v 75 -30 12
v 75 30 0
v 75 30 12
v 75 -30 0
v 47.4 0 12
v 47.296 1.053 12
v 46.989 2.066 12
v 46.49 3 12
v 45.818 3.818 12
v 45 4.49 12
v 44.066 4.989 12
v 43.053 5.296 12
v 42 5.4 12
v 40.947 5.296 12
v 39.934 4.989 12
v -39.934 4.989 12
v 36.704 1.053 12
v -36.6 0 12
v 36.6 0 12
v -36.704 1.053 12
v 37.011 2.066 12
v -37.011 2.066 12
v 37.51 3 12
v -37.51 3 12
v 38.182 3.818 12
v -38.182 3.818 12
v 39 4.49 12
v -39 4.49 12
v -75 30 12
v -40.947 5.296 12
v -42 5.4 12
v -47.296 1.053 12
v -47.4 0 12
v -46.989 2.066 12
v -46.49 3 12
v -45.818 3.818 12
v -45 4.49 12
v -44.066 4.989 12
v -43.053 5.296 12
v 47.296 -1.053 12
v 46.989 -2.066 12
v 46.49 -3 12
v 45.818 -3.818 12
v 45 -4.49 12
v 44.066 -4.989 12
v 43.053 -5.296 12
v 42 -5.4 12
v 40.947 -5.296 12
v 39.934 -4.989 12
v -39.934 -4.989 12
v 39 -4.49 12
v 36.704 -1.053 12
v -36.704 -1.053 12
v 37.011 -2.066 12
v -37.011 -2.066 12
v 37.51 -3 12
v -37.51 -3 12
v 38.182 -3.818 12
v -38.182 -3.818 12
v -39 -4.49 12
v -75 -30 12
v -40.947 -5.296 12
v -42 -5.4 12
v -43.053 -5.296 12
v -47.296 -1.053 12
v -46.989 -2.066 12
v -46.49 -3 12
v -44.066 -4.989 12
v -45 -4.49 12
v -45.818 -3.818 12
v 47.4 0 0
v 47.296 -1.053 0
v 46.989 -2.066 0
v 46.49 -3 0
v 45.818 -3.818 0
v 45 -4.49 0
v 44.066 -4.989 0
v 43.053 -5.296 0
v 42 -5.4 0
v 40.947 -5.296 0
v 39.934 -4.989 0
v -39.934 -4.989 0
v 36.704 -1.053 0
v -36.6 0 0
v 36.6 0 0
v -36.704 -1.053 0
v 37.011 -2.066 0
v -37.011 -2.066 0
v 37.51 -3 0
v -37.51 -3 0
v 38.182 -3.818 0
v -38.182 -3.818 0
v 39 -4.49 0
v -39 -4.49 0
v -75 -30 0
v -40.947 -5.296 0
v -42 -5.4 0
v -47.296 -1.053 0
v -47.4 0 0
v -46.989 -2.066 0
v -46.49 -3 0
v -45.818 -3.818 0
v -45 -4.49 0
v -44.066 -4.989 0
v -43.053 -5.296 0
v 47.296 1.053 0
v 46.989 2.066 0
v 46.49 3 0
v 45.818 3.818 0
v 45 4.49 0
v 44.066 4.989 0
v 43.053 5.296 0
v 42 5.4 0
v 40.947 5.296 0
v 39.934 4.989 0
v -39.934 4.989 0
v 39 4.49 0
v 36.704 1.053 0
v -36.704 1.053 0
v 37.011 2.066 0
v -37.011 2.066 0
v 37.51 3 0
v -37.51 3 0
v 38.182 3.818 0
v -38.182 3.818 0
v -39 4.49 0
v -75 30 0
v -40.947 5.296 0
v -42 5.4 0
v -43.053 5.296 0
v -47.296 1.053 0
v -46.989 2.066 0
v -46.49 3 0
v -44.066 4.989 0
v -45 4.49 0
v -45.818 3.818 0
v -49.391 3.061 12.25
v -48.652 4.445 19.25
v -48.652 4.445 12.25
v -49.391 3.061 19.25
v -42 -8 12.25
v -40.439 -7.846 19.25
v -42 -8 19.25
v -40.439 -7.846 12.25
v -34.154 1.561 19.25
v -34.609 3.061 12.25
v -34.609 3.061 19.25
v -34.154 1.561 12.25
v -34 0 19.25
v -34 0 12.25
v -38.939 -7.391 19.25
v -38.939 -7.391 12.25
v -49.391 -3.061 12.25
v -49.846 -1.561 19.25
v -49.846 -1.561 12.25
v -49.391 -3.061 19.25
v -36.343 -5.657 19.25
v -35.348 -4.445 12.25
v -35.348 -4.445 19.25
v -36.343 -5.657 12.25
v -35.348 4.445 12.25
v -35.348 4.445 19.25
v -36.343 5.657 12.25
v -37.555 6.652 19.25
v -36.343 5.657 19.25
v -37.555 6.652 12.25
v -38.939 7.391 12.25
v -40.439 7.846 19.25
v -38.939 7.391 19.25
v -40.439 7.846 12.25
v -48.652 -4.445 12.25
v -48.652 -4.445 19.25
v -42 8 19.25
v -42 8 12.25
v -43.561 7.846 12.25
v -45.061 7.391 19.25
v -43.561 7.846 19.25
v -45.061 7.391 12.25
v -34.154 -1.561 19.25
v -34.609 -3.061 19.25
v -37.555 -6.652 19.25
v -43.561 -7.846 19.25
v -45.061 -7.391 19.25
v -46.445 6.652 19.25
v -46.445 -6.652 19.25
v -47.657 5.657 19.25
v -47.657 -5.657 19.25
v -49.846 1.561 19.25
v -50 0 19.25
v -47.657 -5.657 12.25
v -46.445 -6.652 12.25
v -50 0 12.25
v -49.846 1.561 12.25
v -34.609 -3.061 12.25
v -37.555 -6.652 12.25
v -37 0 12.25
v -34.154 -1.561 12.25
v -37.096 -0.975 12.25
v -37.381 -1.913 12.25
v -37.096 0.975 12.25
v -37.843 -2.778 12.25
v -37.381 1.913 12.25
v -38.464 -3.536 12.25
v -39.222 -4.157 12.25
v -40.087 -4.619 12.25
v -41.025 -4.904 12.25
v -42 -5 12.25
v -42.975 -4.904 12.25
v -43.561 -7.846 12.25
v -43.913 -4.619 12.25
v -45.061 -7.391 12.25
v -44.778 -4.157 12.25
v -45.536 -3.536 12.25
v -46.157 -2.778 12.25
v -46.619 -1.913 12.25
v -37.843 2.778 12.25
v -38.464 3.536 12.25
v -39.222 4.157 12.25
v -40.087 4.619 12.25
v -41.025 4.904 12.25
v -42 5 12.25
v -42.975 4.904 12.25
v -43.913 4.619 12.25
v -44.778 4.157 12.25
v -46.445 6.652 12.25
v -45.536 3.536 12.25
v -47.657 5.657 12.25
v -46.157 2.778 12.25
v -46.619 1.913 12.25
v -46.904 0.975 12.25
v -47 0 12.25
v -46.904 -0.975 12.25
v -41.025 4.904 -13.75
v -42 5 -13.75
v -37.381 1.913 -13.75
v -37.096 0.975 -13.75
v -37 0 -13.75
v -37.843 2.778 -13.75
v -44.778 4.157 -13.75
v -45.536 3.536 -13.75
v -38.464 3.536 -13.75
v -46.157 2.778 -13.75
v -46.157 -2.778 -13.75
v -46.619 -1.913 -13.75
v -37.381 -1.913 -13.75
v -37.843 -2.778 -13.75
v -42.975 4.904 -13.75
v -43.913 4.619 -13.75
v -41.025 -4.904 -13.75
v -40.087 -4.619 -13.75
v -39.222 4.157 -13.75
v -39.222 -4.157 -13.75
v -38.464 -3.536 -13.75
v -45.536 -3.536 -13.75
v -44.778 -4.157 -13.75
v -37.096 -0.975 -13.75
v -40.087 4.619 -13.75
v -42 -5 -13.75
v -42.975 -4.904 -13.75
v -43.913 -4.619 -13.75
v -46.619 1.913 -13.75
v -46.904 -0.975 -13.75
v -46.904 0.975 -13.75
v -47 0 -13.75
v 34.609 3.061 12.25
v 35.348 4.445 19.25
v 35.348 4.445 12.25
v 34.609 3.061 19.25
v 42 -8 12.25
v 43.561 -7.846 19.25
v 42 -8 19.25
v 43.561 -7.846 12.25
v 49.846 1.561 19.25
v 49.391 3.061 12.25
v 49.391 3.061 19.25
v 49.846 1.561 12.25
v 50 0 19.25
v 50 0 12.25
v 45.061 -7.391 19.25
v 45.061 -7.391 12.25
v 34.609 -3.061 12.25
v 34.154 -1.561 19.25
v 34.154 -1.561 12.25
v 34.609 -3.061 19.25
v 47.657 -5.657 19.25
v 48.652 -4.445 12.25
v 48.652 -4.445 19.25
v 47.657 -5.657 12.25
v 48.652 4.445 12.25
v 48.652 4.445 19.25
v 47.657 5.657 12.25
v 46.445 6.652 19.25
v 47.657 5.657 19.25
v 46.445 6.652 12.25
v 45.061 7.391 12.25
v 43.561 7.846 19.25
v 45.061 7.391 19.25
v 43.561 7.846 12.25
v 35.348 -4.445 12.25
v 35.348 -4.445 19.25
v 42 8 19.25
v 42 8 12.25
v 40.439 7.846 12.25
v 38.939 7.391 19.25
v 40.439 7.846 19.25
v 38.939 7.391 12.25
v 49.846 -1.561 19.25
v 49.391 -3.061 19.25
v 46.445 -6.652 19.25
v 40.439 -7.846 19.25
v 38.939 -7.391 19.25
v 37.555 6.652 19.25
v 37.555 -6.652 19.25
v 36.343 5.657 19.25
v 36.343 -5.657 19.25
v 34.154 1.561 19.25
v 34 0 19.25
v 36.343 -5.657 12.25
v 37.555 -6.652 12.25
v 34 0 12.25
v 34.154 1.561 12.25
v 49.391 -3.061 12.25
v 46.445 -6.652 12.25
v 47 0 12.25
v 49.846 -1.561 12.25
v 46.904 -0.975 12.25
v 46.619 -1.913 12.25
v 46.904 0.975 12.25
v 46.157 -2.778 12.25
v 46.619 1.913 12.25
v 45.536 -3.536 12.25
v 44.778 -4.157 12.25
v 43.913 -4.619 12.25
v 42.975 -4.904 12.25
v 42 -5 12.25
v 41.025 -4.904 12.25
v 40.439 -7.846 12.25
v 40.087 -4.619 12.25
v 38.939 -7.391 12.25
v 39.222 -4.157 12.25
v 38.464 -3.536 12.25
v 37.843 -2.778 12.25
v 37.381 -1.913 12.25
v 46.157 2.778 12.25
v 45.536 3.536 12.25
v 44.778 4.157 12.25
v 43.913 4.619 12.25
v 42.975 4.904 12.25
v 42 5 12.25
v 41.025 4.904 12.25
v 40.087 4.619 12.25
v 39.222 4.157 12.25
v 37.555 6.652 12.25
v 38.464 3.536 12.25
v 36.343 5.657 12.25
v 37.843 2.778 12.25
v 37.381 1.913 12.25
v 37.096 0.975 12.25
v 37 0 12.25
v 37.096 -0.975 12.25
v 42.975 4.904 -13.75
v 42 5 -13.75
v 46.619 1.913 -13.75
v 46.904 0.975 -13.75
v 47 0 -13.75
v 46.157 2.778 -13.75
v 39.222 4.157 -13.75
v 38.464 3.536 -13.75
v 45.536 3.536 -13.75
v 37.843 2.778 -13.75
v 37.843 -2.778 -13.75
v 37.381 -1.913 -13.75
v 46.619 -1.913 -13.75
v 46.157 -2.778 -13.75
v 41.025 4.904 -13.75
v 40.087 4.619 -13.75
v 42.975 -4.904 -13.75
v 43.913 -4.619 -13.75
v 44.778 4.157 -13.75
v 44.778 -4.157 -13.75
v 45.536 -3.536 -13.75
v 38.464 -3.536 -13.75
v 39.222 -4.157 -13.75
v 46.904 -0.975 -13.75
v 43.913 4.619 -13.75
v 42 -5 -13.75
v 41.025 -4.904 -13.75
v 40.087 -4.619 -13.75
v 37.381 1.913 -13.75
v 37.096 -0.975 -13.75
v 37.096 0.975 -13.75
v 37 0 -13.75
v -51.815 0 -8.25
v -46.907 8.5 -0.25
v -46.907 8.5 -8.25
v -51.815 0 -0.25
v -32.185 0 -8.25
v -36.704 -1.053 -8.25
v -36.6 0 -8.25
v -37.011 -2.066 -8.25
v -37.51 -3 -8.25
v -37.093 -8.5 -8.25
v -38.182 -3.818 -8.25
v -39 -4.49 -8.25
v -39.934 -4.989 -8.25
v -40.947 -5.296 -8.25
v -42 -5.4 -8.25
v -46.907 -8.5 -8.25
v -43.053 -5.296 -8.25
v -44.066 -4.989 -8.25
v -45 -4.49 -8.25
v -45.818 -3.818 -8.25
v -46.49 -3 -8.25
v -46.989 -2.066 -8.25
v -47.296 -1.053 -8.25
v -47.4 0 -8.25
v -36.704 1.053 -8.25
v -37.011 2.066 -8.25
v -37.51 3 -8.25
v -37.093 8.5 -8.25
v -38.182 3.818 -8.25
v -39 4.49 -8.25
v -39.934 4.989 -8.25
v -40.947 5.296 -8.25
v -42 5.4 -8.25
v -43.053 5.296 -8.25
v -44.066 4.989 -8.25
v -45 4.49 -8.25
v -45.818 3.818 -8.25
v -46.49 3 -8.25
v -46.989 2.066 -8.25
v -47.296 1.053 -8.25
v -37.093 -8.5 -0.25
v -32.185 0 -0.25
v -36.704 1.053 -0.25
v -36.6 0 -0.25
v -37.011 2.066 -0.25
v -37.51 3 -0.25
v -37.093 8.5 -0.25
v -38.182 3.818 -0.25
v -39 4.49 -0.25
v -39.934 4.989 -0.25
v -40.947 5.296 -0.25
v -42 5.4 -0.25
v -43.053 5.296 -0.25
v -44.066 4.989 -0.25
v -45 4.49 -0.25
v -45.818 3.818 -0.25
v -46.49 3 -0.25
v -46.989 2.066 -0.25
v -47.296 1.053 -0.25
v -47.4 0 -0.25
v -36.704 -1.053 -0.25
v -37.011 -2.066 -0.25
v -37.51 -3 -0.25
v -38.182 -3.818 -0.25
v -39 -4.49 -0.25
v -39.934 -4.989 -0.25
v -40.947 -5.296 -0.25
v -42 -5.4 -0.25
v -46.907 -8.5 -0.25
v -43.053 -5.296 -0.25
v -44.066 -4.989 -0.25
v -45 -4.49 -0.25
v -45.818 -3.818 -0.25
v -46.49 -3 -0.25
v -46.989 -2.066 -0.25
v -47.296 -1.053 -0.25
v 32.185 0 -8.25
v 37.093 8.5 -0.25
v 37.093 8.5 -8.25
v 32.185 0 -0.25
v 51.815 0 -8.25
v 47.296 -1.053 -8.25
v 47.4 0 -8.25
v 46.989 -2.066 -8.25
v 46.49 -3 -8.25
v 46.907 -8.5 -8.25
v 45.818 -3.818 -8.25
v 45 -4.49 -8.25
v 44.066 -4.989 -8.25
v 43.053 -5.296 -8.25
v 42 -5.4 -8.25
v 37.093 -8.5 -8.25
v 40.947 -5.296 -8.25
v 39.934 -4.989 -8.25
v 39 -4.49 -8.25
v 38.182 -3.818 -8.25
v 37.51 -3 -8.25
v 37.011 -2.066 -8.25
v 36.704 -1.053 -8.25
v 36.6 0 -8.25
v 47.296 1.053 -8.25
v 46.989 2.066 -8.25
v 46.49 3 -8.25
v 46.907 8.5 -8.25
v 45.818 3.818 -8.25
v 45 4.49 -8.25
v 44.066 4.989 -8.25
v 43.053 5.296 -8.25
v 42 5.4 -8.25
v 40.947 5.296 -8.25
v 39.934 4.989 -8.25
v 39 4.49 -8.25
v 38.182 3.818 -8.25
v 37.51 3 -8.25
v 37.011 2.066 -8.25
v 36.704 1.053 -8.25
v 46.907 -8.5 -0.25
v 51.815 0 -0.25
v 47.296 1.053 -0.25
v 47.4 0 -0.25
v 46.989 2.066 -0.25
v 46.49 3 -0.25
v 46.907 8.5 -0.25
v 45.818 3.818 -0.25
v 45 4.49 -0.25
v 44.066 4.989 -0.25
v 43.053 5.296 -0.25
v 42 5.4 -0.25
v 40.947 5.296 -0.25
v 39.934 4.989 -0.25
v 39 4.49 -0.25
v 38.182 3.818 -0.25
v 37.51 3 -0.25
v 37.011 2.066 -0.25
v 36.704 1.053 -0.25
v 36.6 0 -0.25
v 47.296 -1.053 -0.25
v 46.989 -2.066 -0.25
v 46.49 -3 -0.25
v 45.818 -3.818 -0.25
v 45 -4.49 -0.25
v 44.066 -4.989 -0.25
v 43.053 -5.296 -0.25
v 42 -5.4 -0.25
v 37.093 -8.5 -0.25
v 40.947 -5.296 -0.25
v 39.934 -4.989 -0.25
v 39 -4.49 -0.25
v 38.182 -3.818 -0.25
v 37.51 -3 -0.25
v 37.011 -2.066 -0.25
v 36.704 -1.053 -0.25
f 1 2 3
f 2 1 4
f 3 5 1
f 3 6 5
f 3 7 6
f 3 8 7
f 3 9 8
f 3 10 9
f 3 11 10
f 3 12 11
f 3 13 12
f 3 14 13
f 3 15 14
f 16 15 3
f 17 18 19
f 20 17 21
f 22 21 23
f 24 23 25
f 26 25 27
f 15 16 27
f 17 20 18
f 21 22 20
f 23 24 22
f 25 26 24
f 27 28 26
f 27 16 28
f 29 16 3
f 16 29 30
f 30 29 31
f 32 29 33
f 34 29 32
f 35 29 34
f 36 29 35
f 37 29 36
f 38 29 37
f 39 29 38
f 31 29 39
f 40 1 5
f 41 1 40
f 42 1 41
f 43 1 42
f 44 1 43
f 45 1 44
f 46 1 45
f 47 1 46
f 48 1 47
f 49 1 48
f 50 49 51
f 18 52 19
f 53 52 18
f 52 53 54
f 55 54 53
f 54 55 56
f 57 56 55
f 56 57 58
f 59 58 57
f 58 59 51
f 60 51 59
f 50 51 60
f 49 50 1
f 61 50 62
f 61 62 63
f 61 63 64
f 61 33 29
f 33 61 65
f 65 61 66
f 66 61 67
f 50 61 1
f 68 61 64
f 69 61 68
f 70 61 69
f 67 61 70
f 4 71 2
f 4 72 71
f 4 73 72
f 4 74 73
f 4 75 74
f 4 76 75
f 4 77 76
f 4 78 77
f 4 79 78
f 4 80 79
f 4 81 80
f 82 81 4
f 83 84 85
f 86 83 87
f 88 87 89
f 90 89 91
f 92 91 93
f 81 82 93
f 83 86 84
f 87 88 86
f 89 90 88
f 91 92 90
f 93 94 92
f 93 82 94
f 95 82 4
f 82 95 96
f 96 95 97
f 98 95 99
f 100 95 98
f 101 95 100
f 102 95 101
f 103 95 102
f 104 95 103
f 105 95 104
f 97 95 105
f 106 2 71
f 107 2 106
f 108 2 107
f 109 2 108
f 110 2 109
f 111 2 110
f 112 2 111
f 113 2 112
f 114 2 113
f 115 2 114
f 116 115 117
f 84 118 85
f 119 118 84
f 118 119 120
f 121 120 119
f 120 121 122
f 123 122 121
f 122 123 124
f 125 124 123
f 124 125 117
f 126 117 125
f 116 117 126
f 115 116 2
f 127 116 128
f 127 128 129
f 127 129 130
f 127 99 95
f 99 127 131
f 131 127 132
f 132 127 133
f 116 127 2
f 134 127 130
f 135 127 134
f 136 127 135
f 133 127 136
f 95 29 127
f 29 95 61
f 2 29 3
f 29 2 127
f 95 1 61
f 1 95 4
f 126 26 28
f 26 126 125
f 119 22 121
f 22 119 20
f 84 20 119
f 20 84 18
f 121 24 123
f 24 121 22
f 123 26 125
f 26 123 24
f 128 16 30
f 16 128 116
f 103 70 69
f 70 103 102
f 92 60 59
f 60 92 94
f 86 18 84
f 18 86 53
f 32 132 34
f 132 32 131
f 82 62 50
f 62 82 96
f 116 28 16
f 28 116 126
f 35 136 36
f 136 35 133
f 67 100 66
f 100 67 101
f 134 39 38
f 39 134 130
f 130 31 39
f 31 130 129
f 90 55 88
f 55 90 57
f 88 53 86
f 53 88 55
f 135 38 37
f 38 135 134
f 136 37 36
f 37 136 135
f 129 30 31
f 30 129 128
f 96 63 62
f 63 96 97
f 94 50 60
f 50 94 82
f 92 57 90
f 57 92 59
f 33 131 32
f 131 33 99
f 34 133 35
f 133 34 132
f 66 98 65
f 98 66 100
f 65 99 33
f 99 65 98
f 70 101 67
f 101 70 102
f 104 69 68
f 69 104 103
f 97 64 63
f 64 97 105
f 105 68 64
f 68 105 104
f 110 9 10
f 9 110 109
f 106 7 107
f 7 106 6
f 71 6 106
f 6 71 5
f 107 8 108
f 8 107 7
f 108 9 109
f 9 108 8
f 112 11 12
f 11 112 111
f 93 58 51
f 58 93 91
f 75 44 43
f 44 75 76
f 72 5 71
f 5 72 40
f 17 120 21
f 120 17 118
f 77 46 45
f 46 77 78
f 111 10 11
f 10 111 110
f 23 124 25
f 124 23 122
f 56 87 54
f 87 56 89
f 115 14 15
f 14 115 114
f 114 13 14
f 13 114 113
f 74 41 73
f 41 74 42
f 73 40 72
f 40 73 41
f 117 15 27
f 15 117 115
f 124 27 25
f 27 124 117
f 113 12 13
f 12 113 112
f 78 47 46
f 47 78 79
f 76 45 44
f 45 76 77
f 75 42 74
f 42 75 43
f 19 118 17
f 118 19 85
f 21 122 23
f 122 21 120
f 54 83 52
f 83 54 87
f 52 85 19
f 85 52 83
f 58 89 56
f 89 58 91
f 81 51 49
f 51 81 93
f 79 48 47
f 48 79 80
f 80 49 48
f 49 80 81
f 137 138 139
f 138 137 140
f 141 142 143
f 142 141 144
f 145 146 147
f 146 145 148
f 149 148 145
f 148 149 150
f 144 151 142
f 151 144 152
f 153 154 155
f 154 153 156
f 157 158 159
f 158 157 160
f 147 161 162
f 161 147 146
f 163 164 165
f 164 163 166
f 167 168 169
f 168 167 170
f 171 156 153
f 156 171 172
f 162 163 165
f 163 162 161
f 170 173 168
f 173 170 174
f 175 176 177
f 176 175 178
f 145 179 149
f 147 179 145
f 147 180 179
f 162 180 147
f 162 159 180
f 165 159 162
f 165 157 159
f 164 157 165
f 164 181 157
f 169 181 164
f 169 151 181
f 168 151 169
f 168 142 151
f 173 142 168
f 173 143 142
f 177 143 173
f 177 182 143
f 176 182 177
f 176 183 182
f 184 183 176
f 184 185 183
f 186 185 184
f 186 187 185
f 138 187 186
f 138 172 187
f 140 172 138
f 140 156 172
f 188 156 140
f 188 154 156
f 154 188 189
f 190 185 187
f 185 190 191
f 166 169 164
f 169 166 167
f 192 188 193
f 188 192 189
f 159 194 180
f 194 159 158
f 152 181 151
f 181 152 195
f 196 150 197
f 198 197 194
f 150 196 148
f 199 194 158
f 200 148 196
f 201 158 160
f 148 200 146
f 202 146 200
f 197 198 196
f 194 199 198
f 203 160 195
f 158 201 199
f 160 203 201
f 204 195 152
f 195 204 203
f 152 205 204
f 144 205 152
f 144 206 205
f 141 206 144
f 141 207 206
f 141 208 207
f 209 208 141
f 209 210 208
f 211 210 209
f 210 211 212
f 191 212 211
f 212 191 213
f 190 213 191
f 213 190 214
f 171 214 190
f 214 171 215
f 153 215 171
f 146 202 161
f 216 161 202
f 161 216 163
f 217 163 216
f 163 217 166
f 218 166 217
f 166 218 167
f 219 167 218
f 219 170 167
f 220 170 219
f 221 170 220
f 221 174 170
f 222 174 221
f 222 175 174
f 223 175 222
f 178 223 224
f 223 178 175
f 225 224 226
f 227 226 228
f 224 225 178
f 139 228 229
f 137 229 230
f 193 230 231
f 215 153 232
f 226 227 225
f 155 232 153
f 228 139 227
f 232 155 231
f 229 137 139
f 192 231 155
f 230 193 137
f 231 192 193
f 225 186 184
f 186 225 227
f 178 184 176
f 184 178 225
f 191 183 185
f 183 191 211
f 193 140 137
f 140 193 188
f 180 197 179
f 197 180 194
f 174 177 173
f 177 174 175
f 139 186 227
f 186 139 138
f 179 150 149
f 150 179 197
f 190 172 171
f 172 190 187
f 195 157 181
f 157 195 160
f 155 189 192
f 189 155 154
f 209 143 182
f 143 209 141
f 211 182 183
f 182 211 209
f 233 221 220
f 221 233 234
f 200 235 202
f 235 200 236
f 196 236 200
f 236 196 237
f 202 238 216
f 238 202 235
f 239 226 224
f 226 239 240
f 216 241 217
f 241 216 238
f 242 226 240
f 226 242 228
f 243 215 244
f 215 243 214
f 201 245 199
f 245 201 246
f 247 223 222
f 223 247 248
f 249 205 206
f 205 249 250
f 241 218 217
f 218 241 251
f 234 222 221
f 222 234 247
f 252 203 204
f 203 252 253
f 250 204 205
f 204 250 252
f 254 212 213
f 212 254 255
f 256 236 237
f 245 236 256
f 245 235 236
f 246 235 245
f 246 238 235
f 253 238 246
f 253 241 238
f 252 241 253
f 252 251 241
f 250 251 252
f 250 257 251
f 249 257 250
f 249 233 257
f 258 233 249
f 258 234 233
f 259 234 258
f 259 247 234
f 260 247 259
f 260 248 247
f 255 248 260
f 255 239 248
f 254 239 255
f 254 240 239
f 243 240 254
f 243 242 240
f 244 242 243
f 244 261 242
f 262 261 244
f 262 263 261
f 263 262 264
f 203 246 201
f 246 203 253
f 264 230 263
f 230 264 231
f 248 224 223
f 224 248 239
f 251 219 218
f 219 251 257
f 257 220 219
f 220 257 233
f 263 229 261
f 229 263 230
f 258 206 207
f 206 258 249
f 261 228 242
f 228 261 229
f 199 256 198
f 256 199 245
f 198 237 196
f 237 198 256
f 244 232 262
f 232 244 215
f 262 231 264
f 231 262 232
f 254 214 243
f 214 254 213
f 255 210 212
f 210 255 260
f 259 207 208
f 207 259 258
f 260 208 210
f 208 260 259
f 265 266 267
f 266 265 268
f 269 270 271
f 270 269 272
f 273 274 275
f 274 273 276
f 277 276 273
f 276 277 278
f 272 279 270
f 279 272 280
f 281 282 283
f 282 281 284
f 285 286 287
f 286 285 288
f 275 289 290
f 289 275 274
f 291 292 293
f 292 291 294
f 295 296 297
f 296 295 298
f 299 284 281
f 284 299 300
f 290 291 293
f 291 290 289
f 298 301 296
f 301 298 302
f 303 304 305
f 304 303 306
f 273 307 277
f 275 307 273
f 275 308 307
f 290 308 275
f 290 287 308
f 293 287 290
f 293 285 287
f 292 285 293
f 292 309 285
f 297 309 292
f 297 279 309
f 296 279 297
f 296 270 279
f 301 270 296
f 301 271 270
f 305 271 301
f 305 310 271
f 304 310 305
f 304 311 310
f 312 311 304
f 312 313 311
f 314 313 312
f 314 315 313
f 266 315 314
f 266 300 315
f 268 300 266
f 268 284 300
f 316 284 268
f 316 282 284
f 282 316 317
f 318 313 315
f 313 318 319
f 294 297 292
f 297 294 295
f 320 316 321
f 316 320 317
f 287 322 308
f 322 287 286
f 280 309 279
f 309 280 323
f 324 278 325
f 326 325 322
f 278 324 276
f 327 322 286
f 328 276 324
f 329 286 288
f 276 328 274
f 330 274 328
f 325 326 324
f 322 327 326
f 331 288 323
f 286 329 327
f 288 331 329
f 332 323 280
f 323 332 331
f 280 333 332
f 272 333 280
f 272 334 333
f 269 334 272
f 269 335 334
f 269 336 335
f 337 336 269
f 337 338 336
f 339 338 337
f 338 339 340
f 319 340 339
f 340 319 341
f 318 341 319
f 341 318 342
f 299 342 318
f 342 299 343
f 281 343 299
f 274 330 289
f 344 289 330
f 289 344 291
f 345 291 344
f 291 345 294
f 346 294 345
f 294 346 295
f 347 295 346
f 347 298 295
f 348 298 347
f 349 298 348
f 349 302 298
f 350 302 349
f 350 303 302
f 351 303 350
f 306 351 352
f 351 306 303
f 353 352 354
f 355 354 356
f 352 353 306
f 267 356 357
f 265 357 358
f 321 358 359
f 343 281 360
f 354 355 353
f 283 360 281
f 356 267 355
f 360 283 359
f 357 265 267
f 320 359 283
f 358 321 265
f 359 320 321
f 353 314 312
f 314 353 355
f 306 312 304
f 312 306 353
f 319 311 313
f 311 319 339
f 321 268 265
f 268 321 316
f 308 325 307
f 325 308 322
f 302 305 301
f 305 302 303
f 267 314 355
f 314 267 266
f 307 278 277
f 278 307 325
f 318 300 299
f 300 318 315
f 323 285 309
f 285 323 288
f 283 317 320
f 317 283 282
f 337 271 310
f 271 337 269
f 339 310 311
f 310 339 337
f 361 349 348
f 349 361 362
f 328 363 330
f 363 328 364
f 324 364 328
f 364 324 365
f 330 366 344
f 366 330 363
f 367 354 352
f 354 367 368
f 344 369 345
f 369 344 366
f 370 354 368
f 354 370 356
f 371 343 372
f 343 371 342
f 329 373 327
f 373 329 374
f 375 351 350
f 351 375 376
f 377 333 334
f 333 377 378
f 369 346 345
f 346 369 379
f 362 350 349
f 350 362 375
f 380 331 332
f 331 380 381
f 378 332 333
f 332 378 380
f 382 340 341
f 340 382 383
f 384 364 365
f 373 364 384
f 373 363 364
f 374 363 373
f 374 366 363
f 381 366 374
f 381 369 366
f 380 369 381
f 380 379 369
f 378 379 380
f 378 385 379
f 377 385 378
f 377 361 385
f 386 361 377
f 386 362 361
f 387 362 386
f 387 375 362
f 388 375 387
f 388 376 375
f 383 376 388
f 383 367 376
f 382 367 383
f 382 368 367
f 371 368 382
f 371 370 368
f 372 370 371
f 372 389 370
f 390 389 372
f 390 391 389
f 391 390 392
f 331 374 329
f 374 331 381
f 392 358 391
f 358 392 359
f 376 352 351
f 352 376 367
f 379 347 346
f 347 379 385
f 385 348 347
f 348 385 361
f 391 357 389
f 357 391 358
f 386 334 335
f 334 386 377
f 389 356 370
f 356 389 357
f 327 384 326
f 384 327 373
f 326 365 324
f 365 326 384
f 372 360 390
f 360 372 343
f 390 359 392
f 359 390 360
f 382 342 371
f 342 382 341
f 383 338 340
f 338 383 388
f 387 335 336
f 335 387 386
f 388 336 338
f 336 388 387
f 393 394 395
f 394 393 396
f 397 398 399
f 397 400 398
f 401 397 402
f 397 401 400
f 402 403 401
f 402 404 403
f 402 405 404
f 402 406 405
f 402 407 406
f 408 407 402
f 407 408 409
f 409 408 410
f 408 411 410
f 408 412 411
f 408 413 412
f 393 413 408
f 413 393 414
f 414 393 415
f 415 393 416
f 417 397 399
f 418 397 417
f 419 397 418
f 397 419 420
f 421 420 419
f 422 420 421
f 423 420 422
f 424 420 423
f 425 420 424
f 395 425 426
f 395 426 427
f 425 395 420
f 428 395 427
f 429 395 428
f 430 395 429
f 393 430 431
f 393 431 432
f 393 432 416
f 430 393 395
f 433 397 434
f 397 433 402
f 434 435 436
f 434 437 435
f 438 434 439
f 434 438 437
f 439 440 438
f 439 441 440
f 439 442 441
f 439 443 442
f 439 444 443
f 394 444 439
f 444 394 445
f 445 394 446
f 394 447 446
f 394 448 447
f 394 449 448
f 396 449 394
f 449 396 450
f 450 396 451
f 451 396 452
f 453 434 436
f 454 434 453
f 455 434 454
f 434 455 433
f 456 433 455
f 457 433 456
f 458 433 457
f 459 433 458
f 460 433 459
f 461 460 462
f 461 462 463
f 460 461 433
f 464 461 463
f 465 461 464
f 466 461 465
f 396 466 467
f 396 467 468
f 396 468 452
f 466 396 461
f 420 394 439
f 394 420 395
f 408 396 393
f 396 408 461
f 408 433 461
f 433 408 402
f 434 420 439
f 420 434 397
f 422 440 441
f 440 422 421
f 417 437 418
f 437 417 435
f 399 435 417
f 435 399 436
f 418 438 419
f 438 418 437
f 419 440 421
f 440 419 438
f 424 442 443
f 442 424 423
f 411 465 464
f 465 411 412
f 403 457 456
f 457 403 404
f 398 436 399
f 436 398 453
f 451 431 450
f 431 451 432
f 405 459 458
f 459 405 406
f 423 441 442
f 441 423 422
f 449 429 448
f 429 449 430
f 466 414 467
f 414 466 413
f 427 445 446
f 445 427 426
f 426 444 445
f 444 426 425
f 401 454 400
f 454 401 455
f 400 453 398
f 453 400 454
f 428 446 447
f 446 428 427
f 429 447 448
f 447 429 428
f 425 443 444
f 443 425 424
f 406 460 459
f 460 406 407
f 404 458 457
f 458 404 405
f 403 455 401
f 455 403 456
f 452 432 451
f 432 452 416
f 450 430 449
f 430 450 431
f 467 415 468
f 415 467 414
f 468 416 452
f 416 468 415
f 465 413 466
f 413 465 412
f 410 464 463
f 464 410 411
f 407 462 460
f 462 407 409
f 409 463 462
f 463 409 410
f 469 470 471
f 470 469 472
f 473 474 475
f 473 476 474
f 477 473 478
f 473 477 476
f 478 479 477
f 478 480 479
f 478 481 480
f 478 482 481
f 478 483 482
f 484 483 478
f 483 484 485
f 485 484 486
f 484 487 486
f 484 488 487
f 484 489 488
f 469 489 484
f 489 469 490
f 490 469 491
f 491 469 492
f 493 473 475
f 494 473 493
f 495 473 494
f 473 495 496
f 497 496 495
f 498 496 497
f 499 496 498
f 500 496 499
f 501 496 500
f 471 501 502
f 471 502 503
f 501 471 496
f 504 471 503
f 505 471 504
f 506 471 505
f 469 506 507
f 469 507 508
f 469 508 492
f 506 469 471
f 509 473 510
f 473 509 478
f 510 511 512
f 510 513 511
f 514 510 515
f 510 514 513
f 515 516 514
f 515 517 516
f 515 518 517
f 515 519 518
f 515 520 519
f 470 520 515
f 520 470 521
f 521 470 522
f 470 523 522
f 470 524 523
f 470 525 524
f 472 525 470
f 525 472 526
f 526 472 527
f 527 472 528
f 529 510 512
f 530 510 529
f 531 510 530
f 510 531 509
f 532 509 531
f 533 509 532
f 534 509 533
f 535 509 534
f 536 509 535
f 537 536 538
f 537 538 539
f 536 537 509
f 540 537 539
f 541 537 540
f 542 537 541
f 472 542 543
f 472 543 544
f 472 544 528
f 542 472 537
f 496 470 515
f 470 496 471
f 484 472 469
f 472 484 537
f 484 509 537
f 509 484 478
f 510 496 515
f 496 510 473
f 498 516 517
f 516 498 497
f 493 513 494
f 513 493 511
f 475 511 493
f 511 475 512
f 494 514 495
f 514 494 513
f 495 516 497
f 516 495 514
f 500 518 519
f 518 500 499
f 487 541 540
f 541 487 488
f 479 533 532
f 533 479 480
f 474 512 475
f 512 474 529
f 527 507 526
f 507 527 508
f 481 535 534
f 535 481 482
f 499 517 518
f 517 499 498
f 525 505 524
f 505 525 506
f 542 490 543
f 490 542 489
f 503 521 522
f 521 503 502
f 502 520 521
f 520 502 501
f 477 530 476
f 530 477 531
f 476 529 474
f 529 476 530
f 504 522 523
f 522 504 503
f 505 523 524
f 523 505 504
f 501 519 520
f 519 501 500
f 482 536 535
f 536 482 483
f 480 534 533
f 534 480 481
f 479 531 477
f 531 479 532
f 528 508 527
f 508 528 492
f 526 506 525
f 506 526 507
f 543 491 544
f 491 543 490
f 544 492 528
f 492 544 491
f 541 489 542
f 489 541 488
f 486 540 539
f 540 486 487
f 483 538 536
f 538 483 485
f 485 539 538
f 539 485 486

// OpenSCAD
$fn = 32;

// ------------------------------------------------------------------------
// Bolted plate: 150 x 60 x 12 mm plate, 2 fasteners
// Every part is its own module, assembly() places them once.
// ------------------------------------------------------------------------

// --- part 1 ---
module plate() {
  difference() {
    translate([-75, -30, 0]) cube([150, 60, 12]);
    translate([-42, 0, -1]) cylinder(h = 14, d = 10.8);
    translate([42, 0, -1]) cylinder(h = 14, d = 10.8);
  }
}

// --- part 2 ---
module bolt1() {
  cylinder(h = 7, d = 16);
  translate([0, 0, -26]) cylinder(h = 26, d = 10);
}

// --- part 3 ---
module bolt2() {
  cylinder(h = 7, d = 16);
  translate([0, 0, -26]) cylinder(h = 26, d = 10);
}

// --- part 4 ---
module nut1() {
  difference() {
    linear_extrude(height = 8) polygon(points = [[9.815, 0], [4.907, 8.5], [-4.907, 8.5], [-9.815, 0], [-4.907, -8.5], [4.907, -8.5]]);
    translate([0, 0, -1]) cylinder(h = 10, d = 10.8);
  }
}

// --- part 5 ---
module nut2() {
  difference() {
    linear_extrude(height = 8) polygon(points = [[9.815, 0], [4.907, 8.5], [-4.907, 8.5], [-9.815, 0], [-4.907, -8.5], [4.907, -8.5]]);
    translate([0, 0, -1]) cylinder(h = 10, d = 10.8);
  }
}

// --- assembly ---
module assembly() {
  translate([0, 0, 0]) rotate([0, 0, 0]) plate();
  translate([-42, 0, 12.25]) rotate([0, 0, 0]) bolt1();
  translate([42, 0, 12.25]) rotate([0, 0, 0]) bolt2();
  translate([-42, 0, -8.25]) rotate([0, 0, 0]) nut1();
  translate([42, 0, -8.25]) rotate([0, 0, 0]) nut2();
}

assembly();
